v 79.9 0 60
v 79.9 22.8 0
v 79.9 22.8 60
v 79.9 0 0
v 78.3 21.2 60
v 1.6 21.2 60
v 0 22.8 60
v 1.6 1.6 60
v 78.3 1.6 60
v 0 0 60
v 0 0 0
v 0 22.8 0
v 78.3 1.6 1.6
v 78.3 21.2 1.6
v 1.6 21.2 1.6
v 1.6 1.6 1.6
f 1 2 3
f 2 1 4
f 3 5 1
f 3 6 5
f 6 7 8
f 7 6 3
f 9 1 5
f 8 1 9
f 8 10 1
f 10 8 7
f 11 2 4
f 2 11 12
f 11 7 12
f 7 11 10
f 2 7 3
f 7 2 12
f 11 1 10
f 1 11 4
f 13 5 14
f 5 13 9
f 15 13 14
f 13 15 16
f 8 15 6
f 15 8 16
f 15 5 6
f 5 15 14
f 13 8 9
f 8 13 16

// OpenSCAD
// small digital scale holder

thick=19.2+0.4;
width=76.3+0.4;
height=120/2;

m=0.4*4; m2=m*2;

difference() {
    cube([width+m2, thick+m2, height]);
    translate([m,m,m])
        cube([width, thick, height]);
}
